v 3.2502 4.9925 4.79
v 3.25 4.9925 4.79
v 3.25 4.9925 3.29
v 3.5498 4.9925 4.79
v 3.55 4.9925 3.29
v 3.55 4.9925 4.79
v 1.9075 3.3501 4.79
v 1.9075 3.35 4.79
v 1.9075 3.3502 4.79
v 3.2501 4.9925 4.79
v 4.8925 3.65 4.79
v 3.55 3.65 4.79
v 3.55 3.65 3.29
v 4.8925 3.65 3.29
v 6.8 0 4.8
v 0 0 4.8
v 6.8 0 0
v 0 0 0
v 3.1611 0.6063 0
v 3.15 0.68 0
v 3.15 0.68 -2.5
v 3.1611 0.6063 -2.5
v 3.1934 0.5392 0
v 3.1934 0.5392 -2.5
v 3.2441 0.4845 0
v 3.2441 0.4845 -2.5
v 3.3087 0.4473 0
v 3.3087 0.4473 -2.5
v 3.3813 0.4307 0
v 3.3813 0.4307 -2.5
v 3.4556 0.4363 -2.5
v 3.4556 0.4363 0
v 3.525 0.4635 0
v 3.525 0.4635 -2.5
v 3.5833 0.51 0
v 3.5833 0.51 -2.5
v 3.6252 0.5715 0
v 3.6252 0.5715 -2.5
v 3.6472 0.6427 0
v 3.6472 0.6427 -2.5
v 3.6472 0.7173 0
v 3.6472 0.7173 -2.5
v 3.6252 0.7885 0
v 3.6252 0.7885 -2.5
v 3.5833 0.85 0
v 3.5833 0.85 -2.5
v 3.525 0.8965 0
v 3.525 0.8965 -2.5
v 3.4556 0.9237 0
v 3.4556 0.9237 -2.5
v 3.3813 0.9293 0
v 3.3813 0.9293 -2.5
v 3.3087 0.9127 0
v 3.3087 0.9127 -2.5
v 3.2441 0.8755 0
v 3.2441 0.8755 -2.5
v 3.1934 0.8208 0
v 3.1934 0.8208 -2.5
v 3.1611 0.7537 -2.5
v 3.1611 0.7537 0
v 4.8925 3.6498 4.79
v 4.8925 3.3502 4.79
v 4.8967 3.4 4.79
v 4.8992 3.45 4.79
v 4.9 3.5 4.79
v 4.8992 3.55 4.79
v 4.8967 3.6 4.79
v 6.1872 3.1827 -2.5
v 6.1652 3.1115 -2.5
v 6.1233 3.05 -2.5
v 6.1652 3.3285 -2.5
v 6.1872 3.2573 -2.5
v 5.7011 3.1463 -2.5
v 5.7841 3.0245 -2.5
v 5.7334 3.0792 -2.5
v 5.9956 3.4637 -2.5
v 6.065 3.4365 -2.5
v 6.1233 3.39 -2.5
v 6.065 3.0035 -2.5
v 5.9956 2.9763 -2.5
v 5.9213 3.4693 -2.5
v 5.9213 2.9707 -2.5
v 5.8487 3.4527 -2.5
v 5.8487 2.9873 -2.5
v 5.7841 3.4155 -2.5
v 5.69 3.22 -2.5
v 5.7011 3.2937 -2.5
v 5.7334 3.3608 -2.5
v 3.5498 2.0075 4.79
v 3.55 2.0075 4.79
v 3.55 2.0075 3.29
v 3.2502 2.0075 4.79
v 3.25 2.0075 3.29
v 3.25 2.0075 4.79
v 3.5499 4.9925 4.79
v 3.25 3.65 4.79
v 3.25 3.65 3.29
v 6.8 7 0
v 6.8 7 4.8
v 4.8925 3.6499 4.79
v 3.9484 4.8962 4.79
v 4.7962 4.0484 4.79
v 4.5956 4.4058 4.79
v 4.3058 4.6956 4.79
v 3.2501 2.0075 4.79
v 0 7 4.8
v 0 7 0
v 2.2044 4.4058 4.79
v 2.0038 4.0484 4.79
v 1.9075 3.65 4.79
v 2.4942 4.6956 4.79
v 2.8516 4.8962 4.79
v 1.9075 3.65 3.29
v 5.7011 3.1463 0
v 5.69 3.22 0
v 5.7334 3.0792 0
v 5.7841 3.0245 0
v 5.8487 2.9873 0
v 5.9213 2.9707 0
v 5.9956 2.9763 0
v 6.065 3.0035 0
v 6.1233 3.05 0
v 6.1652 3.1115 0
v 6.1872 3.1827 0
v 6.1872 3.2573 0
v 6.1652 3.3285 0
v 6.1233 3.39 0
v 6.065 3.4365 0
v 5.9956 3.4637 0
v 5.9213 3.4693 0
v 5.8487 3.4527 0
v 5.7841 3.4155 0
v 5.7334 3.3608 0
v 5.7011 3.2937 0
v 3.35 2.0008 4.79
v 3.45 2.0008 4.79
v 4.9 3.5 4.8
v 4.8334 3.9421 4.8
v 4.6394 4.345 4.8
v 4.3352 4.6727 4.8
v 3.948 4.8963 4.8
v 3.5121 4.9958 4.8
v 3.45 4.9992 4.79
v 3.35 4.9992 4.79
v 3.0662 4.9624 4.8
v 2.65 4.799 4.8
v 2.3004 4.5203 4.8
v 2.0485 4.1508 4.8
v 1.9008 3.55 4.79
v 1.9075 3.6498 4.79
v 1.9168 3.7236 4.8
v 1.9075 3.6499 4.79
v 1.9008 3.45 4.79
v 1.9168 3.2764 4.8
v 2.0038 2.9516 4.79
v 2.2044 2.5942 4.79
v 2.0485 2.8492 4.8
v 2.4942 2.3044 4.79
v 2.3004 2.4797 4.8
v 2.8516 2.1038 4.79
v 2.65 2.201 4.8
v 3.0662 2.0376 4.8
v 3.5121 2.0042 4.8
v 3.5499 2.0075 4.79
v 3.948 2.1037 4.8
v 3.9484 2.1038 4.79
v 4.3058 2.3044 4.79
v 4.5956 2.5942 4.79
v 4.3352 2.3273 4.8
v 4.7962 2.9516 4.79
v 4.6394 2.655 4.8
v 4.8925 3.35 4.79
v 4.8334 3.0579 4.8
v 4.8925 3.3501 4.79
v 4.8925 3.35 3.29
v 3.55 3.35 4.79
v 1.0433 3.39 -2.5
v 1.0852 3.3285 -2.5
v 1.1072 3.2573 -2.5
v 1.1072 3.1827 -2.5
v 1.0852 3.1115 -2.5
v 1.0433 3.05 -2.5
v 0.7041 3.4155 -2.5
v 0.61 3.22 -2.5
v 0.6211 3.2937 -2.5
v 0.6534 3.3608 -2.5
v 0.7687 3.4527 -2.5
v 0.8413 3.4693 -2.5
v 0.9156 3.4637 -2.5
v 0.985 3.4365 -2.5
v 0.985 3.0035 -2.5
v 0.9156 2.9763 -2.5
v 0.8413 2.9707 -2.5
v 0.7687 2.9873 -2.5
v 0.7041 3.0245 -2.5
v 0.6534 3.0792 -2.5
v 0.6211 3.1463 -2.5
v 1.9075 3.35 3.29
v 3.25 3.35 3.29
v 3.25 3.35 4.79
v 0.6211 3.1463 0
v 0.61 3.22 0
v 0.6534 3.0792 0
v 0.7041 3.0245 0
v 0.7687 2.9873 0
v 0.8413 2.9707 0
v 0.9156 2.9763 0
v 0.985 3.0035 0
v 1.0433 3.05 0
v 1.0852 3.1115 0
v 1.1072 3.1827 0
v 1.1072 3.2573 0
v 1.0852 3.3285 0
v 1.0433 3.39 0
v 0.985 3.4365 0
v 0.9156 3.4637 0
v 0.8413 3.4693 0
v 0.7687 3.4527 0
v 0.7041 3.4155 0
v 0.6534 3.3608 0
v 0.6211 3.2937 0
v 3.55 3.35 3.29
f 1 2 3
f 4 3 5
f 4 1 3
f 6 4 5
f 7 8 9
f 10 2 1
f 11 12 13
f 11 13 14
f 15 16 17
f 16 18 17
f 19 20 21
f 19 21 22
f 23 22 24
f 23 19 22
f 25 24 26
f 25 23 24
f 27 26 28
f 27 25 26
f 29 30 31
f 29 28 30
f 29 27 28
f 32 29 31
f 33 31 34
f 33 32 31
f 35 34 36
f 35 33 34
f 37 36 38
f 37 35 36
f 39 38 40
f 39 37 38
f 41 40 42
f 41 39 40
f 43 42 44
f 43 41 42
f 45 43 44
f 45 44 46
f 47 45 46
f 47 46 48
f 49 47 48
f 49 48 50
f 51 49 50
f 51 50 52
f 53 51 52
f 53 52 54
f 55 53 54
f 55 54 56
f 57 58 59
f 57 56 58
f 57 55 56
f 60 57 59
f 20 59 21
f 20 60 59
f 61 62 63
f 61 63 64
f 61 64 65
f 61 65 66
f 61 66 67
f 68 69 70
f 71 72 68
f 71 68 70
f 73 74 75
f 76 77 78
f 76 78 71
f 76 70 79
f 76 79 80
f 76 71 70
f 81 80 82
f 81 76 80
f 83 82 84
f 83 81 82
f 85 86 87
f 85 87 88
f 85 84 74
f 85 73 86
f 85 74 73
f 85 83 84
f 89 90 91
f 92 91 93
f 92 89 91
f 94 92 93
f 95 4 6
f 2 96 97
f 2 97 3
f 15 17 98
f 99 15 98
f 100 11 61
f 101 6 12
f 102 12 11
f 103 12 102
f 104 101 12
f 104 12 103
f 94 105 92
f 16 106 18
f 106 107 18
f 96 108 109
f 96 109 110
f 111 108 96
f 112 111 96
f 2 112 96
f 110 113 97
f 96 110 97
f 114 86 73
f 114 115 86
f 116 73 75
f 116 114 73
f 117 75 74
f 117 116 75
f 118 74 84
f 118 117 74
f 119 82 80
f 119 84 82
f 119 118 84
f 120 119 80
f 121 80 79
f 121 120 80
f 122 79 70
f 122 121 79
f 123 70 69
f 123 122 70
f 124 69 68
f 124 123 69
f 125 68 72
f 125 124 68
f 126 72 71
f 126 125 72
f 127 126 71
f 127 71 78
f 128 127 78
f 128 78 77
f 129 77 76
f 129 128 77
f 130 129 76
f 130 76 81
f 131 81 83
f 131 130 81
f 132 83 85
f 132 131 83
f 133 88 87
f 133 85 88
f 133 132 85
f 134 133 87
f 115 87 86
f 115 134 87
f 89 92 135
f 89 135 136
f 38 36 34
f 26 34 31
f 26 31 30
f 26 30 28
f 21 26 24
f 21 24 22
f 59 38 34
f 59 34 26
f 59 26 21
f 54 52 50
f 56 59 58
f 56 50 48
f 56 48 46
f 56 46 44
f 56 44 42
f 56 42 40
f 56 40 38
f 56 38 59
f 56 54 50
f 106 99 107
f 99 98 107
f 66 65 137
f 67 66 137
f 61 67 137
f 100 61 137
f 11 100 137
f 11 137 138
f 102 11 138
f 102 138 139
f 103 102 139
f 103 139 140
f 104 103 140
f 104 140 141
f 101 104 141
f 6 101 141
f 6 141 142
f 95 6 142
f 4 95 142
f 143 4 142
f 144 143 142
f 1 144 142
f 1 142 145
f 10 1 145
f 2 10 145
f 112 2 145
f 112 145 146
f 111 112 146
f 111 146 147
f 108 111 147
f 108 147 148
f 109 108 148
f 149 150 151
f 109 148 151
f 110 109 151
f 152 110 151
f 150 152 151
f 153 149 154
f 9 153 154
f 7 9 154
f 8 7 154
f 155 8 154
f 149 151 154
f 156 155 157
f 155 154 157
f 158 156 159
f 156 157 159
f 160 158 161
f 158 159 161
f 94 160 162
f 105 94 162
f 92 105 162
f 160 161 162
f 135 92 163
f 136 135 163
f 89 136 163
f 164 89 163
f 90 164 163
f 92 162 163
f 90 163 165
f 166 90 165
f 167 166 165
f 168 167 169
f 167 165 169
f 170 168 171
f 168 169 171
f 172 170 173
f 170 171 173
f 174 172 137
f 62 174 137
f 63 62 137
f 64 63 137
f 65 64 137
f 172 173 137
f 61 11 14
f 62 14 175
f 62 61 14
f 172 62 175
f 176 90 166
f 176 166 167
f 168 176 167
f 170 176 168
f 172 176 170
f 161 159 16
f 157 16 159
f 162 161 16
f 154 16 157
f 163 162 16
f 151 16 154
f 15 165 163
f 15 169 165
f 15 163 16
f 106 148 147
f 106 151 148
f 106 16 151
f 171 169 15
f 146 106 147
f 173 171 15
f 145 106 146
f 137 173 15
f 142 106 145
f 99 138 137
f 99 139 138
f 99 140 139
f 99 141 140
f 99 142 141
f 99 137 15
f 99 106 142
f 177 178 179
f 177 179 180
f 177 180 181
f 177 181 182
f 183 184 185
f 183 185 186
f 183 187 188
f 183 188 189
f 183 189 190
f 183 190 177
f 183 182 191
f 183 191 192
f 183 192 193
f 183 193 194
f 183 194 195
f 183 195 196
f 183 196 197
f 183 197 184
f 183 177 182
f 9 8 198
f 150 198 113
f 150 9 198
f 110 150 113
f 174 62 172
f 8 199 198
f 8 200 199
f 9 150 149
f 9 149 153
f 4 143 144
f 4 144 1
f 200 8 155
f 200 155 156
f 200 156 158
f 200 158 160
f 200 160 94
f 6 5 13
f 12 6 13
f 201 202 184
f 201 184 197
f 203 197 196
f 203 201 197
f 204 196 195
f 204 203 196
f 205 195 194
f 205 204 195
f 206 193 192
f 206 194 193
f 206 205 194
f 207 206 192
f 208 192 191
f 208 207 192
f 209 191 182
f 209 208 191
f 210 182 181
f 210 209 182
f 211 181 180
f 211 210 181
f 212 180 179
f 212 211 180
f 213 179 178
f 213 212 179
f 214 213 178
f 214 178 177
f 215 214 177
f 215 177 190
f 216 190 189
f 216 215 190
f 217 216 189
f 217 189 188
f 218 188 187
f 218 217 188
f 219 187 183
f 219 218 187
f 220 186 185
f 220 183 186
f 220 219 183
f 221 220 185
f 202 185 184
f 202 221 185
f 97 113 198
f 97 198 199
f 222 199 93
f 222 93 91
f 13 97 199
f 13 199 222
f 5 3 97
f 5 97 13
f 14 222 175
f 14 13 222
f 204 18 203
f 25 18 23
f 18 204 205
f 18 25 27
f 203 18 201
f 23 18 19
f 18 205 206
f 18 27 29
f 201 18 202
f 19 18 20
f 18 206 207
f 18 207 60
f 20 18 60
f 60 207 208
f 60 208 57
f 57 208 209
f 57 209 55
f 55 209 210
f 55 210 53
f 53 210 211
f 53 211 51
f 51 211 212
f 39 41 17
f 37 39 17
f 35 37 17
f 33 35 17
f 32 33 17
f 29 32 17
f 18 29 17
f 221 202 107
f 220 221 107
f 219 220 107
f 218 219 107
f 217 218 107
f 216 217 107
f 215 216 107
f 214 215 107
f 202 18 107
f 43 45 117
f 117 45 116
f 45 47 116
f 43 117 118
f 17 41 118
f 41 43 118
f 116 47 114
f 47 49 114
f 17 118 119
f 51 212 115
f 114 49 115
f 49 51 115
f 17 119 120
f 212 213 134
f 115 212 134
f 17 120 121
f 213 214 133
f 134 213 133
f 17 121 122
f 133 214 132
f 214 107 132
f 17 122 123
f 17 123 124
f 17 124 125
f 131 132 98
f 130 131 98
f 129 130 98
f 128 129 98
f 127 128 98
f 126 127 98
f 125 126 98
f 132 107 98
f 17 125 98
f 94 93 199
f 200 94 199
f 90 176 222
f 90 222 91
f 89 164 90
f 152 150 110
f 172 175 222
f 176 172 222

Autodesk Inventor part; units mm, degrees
ref_plane "YZ Plane" through (0, 0, 0) normal (1, 0, 0) x (0, 1, 0)
ref_plane "XZ Plane" through (0, 0, 0) normal (0, 1, 0) x (-1, 0, 0)
ref_plane "XY Plane" through (0, 0, 0) normal (0, 0, 1) x (1, 0, 0)
sketch "Skizze1" plane through (0, 0, 0) normal (0, 0, 1) x (1, 0, 0)
  line L0 (0, 0) -> (6.8, 0)
  line L1 (6.8, 0) -> (6.8, 7)
  line L2 (6.8, 7) -> (0, 7)
  line L3 (0, 7) -> (0, 0)
  dimension "d0" = 6.8
  dimension "d1" = 7
extrude "Extrusion1" add sketch "Skizze1" along normal blind 4.8
sketch "Skizze2" plane through (0, 0, 4.8) normal (0, 0, 1) x (1, 0, 0)
  line L0 (0, 0) -> (6.8, 0) construction
  line L1 (6.8, 0) -> (6.8, 7) construction
  line L2 (6.8, 7) -> (0, 7) construction
  line L3 (0, 7) -> (0, 0) construction
  circle A0 centre (3.4, 3.5) radius 1.5
  point P0 (0, 3.5)
  point P1 (3.4, 7)
  dimension "d4" = 3
extrude "Extrusion2" cut sketch "Skizze2" against normal blind 0.01
sketch "Skizze3" plane through (3.4, 3.5, 4.79) normal (0, 0, 1) x (1, 0, 0)
  line L0 (-0.15, 1.4925) -> (0.15, 1.4925)
  line L1 (0.15, -1.4925) -> (-0.15, -1.4925)
  line L2 (1.4925, 0.15) -> (1.4925, -0.15)
  line L3 (-1.4925, -0.15) -> (-1.4925, 0.15)
  line L4 (-1.4925, 0.15) -> (-0.15, 0.15)
  line L5 (0.15, 0.15) -> (1.4925, 0.15)
  line L6 (0.15, 1.4925) -> (0.15, 0.15)
  line L7 (0.15, -0.15) -> (0.15, -1.4925)
  line L8 (-0.15, -1.4925) -> (-0.15, -0.15)
  line L9 (-0.15, 0.15) -> (-0.15, 1.4925)
  line L10 (1.4925, -0.15) -> (0.15, -0.15)
  line L11 (-0.15, -0.15) -> (-1.4925, -0.15)
  line L12 (0, 1.4925) -> (0, -1.4925) construction
  line L13 (-1.4925, 0) -> (1.4925, 0) construction
  circle A0 centre (0, 0) radius 1.5 construction
  point P0 (-3.4, -3.5)
  dimension "d7" = 0.3
extrude "Extrusion3" cut sketch "Skizze3" against normal blind 1.5
sketch "Skizze4" plane through (0, 0, 0) normal (0, 0, -1) x (-1, 0, 0)
  circle A0 centre (-0.86, 3.22) radius 0.25
  circle A1 centre (-5.94, 3.22) radius 0.25
  circle A2 centre (-3.4, 0.68) radius 0.25
  line L0 (0, 0) -> (-6.8, 0) construction
  line L1 (-3.4, 0) -> (-3.4, 7) construction
  line L2 (-6.8, 7) -> (0, 7) construction
  dimension "d10" = 0.5
  dimension "d11" = 5.08
  dimension "d12" = 2.54
  dimension "d13" = 0.68
extrude "Extrusion4" add sketch "Skizze4" along normal blind 2.5
properties part number "Poti" material "PBT-Kunststoff"
